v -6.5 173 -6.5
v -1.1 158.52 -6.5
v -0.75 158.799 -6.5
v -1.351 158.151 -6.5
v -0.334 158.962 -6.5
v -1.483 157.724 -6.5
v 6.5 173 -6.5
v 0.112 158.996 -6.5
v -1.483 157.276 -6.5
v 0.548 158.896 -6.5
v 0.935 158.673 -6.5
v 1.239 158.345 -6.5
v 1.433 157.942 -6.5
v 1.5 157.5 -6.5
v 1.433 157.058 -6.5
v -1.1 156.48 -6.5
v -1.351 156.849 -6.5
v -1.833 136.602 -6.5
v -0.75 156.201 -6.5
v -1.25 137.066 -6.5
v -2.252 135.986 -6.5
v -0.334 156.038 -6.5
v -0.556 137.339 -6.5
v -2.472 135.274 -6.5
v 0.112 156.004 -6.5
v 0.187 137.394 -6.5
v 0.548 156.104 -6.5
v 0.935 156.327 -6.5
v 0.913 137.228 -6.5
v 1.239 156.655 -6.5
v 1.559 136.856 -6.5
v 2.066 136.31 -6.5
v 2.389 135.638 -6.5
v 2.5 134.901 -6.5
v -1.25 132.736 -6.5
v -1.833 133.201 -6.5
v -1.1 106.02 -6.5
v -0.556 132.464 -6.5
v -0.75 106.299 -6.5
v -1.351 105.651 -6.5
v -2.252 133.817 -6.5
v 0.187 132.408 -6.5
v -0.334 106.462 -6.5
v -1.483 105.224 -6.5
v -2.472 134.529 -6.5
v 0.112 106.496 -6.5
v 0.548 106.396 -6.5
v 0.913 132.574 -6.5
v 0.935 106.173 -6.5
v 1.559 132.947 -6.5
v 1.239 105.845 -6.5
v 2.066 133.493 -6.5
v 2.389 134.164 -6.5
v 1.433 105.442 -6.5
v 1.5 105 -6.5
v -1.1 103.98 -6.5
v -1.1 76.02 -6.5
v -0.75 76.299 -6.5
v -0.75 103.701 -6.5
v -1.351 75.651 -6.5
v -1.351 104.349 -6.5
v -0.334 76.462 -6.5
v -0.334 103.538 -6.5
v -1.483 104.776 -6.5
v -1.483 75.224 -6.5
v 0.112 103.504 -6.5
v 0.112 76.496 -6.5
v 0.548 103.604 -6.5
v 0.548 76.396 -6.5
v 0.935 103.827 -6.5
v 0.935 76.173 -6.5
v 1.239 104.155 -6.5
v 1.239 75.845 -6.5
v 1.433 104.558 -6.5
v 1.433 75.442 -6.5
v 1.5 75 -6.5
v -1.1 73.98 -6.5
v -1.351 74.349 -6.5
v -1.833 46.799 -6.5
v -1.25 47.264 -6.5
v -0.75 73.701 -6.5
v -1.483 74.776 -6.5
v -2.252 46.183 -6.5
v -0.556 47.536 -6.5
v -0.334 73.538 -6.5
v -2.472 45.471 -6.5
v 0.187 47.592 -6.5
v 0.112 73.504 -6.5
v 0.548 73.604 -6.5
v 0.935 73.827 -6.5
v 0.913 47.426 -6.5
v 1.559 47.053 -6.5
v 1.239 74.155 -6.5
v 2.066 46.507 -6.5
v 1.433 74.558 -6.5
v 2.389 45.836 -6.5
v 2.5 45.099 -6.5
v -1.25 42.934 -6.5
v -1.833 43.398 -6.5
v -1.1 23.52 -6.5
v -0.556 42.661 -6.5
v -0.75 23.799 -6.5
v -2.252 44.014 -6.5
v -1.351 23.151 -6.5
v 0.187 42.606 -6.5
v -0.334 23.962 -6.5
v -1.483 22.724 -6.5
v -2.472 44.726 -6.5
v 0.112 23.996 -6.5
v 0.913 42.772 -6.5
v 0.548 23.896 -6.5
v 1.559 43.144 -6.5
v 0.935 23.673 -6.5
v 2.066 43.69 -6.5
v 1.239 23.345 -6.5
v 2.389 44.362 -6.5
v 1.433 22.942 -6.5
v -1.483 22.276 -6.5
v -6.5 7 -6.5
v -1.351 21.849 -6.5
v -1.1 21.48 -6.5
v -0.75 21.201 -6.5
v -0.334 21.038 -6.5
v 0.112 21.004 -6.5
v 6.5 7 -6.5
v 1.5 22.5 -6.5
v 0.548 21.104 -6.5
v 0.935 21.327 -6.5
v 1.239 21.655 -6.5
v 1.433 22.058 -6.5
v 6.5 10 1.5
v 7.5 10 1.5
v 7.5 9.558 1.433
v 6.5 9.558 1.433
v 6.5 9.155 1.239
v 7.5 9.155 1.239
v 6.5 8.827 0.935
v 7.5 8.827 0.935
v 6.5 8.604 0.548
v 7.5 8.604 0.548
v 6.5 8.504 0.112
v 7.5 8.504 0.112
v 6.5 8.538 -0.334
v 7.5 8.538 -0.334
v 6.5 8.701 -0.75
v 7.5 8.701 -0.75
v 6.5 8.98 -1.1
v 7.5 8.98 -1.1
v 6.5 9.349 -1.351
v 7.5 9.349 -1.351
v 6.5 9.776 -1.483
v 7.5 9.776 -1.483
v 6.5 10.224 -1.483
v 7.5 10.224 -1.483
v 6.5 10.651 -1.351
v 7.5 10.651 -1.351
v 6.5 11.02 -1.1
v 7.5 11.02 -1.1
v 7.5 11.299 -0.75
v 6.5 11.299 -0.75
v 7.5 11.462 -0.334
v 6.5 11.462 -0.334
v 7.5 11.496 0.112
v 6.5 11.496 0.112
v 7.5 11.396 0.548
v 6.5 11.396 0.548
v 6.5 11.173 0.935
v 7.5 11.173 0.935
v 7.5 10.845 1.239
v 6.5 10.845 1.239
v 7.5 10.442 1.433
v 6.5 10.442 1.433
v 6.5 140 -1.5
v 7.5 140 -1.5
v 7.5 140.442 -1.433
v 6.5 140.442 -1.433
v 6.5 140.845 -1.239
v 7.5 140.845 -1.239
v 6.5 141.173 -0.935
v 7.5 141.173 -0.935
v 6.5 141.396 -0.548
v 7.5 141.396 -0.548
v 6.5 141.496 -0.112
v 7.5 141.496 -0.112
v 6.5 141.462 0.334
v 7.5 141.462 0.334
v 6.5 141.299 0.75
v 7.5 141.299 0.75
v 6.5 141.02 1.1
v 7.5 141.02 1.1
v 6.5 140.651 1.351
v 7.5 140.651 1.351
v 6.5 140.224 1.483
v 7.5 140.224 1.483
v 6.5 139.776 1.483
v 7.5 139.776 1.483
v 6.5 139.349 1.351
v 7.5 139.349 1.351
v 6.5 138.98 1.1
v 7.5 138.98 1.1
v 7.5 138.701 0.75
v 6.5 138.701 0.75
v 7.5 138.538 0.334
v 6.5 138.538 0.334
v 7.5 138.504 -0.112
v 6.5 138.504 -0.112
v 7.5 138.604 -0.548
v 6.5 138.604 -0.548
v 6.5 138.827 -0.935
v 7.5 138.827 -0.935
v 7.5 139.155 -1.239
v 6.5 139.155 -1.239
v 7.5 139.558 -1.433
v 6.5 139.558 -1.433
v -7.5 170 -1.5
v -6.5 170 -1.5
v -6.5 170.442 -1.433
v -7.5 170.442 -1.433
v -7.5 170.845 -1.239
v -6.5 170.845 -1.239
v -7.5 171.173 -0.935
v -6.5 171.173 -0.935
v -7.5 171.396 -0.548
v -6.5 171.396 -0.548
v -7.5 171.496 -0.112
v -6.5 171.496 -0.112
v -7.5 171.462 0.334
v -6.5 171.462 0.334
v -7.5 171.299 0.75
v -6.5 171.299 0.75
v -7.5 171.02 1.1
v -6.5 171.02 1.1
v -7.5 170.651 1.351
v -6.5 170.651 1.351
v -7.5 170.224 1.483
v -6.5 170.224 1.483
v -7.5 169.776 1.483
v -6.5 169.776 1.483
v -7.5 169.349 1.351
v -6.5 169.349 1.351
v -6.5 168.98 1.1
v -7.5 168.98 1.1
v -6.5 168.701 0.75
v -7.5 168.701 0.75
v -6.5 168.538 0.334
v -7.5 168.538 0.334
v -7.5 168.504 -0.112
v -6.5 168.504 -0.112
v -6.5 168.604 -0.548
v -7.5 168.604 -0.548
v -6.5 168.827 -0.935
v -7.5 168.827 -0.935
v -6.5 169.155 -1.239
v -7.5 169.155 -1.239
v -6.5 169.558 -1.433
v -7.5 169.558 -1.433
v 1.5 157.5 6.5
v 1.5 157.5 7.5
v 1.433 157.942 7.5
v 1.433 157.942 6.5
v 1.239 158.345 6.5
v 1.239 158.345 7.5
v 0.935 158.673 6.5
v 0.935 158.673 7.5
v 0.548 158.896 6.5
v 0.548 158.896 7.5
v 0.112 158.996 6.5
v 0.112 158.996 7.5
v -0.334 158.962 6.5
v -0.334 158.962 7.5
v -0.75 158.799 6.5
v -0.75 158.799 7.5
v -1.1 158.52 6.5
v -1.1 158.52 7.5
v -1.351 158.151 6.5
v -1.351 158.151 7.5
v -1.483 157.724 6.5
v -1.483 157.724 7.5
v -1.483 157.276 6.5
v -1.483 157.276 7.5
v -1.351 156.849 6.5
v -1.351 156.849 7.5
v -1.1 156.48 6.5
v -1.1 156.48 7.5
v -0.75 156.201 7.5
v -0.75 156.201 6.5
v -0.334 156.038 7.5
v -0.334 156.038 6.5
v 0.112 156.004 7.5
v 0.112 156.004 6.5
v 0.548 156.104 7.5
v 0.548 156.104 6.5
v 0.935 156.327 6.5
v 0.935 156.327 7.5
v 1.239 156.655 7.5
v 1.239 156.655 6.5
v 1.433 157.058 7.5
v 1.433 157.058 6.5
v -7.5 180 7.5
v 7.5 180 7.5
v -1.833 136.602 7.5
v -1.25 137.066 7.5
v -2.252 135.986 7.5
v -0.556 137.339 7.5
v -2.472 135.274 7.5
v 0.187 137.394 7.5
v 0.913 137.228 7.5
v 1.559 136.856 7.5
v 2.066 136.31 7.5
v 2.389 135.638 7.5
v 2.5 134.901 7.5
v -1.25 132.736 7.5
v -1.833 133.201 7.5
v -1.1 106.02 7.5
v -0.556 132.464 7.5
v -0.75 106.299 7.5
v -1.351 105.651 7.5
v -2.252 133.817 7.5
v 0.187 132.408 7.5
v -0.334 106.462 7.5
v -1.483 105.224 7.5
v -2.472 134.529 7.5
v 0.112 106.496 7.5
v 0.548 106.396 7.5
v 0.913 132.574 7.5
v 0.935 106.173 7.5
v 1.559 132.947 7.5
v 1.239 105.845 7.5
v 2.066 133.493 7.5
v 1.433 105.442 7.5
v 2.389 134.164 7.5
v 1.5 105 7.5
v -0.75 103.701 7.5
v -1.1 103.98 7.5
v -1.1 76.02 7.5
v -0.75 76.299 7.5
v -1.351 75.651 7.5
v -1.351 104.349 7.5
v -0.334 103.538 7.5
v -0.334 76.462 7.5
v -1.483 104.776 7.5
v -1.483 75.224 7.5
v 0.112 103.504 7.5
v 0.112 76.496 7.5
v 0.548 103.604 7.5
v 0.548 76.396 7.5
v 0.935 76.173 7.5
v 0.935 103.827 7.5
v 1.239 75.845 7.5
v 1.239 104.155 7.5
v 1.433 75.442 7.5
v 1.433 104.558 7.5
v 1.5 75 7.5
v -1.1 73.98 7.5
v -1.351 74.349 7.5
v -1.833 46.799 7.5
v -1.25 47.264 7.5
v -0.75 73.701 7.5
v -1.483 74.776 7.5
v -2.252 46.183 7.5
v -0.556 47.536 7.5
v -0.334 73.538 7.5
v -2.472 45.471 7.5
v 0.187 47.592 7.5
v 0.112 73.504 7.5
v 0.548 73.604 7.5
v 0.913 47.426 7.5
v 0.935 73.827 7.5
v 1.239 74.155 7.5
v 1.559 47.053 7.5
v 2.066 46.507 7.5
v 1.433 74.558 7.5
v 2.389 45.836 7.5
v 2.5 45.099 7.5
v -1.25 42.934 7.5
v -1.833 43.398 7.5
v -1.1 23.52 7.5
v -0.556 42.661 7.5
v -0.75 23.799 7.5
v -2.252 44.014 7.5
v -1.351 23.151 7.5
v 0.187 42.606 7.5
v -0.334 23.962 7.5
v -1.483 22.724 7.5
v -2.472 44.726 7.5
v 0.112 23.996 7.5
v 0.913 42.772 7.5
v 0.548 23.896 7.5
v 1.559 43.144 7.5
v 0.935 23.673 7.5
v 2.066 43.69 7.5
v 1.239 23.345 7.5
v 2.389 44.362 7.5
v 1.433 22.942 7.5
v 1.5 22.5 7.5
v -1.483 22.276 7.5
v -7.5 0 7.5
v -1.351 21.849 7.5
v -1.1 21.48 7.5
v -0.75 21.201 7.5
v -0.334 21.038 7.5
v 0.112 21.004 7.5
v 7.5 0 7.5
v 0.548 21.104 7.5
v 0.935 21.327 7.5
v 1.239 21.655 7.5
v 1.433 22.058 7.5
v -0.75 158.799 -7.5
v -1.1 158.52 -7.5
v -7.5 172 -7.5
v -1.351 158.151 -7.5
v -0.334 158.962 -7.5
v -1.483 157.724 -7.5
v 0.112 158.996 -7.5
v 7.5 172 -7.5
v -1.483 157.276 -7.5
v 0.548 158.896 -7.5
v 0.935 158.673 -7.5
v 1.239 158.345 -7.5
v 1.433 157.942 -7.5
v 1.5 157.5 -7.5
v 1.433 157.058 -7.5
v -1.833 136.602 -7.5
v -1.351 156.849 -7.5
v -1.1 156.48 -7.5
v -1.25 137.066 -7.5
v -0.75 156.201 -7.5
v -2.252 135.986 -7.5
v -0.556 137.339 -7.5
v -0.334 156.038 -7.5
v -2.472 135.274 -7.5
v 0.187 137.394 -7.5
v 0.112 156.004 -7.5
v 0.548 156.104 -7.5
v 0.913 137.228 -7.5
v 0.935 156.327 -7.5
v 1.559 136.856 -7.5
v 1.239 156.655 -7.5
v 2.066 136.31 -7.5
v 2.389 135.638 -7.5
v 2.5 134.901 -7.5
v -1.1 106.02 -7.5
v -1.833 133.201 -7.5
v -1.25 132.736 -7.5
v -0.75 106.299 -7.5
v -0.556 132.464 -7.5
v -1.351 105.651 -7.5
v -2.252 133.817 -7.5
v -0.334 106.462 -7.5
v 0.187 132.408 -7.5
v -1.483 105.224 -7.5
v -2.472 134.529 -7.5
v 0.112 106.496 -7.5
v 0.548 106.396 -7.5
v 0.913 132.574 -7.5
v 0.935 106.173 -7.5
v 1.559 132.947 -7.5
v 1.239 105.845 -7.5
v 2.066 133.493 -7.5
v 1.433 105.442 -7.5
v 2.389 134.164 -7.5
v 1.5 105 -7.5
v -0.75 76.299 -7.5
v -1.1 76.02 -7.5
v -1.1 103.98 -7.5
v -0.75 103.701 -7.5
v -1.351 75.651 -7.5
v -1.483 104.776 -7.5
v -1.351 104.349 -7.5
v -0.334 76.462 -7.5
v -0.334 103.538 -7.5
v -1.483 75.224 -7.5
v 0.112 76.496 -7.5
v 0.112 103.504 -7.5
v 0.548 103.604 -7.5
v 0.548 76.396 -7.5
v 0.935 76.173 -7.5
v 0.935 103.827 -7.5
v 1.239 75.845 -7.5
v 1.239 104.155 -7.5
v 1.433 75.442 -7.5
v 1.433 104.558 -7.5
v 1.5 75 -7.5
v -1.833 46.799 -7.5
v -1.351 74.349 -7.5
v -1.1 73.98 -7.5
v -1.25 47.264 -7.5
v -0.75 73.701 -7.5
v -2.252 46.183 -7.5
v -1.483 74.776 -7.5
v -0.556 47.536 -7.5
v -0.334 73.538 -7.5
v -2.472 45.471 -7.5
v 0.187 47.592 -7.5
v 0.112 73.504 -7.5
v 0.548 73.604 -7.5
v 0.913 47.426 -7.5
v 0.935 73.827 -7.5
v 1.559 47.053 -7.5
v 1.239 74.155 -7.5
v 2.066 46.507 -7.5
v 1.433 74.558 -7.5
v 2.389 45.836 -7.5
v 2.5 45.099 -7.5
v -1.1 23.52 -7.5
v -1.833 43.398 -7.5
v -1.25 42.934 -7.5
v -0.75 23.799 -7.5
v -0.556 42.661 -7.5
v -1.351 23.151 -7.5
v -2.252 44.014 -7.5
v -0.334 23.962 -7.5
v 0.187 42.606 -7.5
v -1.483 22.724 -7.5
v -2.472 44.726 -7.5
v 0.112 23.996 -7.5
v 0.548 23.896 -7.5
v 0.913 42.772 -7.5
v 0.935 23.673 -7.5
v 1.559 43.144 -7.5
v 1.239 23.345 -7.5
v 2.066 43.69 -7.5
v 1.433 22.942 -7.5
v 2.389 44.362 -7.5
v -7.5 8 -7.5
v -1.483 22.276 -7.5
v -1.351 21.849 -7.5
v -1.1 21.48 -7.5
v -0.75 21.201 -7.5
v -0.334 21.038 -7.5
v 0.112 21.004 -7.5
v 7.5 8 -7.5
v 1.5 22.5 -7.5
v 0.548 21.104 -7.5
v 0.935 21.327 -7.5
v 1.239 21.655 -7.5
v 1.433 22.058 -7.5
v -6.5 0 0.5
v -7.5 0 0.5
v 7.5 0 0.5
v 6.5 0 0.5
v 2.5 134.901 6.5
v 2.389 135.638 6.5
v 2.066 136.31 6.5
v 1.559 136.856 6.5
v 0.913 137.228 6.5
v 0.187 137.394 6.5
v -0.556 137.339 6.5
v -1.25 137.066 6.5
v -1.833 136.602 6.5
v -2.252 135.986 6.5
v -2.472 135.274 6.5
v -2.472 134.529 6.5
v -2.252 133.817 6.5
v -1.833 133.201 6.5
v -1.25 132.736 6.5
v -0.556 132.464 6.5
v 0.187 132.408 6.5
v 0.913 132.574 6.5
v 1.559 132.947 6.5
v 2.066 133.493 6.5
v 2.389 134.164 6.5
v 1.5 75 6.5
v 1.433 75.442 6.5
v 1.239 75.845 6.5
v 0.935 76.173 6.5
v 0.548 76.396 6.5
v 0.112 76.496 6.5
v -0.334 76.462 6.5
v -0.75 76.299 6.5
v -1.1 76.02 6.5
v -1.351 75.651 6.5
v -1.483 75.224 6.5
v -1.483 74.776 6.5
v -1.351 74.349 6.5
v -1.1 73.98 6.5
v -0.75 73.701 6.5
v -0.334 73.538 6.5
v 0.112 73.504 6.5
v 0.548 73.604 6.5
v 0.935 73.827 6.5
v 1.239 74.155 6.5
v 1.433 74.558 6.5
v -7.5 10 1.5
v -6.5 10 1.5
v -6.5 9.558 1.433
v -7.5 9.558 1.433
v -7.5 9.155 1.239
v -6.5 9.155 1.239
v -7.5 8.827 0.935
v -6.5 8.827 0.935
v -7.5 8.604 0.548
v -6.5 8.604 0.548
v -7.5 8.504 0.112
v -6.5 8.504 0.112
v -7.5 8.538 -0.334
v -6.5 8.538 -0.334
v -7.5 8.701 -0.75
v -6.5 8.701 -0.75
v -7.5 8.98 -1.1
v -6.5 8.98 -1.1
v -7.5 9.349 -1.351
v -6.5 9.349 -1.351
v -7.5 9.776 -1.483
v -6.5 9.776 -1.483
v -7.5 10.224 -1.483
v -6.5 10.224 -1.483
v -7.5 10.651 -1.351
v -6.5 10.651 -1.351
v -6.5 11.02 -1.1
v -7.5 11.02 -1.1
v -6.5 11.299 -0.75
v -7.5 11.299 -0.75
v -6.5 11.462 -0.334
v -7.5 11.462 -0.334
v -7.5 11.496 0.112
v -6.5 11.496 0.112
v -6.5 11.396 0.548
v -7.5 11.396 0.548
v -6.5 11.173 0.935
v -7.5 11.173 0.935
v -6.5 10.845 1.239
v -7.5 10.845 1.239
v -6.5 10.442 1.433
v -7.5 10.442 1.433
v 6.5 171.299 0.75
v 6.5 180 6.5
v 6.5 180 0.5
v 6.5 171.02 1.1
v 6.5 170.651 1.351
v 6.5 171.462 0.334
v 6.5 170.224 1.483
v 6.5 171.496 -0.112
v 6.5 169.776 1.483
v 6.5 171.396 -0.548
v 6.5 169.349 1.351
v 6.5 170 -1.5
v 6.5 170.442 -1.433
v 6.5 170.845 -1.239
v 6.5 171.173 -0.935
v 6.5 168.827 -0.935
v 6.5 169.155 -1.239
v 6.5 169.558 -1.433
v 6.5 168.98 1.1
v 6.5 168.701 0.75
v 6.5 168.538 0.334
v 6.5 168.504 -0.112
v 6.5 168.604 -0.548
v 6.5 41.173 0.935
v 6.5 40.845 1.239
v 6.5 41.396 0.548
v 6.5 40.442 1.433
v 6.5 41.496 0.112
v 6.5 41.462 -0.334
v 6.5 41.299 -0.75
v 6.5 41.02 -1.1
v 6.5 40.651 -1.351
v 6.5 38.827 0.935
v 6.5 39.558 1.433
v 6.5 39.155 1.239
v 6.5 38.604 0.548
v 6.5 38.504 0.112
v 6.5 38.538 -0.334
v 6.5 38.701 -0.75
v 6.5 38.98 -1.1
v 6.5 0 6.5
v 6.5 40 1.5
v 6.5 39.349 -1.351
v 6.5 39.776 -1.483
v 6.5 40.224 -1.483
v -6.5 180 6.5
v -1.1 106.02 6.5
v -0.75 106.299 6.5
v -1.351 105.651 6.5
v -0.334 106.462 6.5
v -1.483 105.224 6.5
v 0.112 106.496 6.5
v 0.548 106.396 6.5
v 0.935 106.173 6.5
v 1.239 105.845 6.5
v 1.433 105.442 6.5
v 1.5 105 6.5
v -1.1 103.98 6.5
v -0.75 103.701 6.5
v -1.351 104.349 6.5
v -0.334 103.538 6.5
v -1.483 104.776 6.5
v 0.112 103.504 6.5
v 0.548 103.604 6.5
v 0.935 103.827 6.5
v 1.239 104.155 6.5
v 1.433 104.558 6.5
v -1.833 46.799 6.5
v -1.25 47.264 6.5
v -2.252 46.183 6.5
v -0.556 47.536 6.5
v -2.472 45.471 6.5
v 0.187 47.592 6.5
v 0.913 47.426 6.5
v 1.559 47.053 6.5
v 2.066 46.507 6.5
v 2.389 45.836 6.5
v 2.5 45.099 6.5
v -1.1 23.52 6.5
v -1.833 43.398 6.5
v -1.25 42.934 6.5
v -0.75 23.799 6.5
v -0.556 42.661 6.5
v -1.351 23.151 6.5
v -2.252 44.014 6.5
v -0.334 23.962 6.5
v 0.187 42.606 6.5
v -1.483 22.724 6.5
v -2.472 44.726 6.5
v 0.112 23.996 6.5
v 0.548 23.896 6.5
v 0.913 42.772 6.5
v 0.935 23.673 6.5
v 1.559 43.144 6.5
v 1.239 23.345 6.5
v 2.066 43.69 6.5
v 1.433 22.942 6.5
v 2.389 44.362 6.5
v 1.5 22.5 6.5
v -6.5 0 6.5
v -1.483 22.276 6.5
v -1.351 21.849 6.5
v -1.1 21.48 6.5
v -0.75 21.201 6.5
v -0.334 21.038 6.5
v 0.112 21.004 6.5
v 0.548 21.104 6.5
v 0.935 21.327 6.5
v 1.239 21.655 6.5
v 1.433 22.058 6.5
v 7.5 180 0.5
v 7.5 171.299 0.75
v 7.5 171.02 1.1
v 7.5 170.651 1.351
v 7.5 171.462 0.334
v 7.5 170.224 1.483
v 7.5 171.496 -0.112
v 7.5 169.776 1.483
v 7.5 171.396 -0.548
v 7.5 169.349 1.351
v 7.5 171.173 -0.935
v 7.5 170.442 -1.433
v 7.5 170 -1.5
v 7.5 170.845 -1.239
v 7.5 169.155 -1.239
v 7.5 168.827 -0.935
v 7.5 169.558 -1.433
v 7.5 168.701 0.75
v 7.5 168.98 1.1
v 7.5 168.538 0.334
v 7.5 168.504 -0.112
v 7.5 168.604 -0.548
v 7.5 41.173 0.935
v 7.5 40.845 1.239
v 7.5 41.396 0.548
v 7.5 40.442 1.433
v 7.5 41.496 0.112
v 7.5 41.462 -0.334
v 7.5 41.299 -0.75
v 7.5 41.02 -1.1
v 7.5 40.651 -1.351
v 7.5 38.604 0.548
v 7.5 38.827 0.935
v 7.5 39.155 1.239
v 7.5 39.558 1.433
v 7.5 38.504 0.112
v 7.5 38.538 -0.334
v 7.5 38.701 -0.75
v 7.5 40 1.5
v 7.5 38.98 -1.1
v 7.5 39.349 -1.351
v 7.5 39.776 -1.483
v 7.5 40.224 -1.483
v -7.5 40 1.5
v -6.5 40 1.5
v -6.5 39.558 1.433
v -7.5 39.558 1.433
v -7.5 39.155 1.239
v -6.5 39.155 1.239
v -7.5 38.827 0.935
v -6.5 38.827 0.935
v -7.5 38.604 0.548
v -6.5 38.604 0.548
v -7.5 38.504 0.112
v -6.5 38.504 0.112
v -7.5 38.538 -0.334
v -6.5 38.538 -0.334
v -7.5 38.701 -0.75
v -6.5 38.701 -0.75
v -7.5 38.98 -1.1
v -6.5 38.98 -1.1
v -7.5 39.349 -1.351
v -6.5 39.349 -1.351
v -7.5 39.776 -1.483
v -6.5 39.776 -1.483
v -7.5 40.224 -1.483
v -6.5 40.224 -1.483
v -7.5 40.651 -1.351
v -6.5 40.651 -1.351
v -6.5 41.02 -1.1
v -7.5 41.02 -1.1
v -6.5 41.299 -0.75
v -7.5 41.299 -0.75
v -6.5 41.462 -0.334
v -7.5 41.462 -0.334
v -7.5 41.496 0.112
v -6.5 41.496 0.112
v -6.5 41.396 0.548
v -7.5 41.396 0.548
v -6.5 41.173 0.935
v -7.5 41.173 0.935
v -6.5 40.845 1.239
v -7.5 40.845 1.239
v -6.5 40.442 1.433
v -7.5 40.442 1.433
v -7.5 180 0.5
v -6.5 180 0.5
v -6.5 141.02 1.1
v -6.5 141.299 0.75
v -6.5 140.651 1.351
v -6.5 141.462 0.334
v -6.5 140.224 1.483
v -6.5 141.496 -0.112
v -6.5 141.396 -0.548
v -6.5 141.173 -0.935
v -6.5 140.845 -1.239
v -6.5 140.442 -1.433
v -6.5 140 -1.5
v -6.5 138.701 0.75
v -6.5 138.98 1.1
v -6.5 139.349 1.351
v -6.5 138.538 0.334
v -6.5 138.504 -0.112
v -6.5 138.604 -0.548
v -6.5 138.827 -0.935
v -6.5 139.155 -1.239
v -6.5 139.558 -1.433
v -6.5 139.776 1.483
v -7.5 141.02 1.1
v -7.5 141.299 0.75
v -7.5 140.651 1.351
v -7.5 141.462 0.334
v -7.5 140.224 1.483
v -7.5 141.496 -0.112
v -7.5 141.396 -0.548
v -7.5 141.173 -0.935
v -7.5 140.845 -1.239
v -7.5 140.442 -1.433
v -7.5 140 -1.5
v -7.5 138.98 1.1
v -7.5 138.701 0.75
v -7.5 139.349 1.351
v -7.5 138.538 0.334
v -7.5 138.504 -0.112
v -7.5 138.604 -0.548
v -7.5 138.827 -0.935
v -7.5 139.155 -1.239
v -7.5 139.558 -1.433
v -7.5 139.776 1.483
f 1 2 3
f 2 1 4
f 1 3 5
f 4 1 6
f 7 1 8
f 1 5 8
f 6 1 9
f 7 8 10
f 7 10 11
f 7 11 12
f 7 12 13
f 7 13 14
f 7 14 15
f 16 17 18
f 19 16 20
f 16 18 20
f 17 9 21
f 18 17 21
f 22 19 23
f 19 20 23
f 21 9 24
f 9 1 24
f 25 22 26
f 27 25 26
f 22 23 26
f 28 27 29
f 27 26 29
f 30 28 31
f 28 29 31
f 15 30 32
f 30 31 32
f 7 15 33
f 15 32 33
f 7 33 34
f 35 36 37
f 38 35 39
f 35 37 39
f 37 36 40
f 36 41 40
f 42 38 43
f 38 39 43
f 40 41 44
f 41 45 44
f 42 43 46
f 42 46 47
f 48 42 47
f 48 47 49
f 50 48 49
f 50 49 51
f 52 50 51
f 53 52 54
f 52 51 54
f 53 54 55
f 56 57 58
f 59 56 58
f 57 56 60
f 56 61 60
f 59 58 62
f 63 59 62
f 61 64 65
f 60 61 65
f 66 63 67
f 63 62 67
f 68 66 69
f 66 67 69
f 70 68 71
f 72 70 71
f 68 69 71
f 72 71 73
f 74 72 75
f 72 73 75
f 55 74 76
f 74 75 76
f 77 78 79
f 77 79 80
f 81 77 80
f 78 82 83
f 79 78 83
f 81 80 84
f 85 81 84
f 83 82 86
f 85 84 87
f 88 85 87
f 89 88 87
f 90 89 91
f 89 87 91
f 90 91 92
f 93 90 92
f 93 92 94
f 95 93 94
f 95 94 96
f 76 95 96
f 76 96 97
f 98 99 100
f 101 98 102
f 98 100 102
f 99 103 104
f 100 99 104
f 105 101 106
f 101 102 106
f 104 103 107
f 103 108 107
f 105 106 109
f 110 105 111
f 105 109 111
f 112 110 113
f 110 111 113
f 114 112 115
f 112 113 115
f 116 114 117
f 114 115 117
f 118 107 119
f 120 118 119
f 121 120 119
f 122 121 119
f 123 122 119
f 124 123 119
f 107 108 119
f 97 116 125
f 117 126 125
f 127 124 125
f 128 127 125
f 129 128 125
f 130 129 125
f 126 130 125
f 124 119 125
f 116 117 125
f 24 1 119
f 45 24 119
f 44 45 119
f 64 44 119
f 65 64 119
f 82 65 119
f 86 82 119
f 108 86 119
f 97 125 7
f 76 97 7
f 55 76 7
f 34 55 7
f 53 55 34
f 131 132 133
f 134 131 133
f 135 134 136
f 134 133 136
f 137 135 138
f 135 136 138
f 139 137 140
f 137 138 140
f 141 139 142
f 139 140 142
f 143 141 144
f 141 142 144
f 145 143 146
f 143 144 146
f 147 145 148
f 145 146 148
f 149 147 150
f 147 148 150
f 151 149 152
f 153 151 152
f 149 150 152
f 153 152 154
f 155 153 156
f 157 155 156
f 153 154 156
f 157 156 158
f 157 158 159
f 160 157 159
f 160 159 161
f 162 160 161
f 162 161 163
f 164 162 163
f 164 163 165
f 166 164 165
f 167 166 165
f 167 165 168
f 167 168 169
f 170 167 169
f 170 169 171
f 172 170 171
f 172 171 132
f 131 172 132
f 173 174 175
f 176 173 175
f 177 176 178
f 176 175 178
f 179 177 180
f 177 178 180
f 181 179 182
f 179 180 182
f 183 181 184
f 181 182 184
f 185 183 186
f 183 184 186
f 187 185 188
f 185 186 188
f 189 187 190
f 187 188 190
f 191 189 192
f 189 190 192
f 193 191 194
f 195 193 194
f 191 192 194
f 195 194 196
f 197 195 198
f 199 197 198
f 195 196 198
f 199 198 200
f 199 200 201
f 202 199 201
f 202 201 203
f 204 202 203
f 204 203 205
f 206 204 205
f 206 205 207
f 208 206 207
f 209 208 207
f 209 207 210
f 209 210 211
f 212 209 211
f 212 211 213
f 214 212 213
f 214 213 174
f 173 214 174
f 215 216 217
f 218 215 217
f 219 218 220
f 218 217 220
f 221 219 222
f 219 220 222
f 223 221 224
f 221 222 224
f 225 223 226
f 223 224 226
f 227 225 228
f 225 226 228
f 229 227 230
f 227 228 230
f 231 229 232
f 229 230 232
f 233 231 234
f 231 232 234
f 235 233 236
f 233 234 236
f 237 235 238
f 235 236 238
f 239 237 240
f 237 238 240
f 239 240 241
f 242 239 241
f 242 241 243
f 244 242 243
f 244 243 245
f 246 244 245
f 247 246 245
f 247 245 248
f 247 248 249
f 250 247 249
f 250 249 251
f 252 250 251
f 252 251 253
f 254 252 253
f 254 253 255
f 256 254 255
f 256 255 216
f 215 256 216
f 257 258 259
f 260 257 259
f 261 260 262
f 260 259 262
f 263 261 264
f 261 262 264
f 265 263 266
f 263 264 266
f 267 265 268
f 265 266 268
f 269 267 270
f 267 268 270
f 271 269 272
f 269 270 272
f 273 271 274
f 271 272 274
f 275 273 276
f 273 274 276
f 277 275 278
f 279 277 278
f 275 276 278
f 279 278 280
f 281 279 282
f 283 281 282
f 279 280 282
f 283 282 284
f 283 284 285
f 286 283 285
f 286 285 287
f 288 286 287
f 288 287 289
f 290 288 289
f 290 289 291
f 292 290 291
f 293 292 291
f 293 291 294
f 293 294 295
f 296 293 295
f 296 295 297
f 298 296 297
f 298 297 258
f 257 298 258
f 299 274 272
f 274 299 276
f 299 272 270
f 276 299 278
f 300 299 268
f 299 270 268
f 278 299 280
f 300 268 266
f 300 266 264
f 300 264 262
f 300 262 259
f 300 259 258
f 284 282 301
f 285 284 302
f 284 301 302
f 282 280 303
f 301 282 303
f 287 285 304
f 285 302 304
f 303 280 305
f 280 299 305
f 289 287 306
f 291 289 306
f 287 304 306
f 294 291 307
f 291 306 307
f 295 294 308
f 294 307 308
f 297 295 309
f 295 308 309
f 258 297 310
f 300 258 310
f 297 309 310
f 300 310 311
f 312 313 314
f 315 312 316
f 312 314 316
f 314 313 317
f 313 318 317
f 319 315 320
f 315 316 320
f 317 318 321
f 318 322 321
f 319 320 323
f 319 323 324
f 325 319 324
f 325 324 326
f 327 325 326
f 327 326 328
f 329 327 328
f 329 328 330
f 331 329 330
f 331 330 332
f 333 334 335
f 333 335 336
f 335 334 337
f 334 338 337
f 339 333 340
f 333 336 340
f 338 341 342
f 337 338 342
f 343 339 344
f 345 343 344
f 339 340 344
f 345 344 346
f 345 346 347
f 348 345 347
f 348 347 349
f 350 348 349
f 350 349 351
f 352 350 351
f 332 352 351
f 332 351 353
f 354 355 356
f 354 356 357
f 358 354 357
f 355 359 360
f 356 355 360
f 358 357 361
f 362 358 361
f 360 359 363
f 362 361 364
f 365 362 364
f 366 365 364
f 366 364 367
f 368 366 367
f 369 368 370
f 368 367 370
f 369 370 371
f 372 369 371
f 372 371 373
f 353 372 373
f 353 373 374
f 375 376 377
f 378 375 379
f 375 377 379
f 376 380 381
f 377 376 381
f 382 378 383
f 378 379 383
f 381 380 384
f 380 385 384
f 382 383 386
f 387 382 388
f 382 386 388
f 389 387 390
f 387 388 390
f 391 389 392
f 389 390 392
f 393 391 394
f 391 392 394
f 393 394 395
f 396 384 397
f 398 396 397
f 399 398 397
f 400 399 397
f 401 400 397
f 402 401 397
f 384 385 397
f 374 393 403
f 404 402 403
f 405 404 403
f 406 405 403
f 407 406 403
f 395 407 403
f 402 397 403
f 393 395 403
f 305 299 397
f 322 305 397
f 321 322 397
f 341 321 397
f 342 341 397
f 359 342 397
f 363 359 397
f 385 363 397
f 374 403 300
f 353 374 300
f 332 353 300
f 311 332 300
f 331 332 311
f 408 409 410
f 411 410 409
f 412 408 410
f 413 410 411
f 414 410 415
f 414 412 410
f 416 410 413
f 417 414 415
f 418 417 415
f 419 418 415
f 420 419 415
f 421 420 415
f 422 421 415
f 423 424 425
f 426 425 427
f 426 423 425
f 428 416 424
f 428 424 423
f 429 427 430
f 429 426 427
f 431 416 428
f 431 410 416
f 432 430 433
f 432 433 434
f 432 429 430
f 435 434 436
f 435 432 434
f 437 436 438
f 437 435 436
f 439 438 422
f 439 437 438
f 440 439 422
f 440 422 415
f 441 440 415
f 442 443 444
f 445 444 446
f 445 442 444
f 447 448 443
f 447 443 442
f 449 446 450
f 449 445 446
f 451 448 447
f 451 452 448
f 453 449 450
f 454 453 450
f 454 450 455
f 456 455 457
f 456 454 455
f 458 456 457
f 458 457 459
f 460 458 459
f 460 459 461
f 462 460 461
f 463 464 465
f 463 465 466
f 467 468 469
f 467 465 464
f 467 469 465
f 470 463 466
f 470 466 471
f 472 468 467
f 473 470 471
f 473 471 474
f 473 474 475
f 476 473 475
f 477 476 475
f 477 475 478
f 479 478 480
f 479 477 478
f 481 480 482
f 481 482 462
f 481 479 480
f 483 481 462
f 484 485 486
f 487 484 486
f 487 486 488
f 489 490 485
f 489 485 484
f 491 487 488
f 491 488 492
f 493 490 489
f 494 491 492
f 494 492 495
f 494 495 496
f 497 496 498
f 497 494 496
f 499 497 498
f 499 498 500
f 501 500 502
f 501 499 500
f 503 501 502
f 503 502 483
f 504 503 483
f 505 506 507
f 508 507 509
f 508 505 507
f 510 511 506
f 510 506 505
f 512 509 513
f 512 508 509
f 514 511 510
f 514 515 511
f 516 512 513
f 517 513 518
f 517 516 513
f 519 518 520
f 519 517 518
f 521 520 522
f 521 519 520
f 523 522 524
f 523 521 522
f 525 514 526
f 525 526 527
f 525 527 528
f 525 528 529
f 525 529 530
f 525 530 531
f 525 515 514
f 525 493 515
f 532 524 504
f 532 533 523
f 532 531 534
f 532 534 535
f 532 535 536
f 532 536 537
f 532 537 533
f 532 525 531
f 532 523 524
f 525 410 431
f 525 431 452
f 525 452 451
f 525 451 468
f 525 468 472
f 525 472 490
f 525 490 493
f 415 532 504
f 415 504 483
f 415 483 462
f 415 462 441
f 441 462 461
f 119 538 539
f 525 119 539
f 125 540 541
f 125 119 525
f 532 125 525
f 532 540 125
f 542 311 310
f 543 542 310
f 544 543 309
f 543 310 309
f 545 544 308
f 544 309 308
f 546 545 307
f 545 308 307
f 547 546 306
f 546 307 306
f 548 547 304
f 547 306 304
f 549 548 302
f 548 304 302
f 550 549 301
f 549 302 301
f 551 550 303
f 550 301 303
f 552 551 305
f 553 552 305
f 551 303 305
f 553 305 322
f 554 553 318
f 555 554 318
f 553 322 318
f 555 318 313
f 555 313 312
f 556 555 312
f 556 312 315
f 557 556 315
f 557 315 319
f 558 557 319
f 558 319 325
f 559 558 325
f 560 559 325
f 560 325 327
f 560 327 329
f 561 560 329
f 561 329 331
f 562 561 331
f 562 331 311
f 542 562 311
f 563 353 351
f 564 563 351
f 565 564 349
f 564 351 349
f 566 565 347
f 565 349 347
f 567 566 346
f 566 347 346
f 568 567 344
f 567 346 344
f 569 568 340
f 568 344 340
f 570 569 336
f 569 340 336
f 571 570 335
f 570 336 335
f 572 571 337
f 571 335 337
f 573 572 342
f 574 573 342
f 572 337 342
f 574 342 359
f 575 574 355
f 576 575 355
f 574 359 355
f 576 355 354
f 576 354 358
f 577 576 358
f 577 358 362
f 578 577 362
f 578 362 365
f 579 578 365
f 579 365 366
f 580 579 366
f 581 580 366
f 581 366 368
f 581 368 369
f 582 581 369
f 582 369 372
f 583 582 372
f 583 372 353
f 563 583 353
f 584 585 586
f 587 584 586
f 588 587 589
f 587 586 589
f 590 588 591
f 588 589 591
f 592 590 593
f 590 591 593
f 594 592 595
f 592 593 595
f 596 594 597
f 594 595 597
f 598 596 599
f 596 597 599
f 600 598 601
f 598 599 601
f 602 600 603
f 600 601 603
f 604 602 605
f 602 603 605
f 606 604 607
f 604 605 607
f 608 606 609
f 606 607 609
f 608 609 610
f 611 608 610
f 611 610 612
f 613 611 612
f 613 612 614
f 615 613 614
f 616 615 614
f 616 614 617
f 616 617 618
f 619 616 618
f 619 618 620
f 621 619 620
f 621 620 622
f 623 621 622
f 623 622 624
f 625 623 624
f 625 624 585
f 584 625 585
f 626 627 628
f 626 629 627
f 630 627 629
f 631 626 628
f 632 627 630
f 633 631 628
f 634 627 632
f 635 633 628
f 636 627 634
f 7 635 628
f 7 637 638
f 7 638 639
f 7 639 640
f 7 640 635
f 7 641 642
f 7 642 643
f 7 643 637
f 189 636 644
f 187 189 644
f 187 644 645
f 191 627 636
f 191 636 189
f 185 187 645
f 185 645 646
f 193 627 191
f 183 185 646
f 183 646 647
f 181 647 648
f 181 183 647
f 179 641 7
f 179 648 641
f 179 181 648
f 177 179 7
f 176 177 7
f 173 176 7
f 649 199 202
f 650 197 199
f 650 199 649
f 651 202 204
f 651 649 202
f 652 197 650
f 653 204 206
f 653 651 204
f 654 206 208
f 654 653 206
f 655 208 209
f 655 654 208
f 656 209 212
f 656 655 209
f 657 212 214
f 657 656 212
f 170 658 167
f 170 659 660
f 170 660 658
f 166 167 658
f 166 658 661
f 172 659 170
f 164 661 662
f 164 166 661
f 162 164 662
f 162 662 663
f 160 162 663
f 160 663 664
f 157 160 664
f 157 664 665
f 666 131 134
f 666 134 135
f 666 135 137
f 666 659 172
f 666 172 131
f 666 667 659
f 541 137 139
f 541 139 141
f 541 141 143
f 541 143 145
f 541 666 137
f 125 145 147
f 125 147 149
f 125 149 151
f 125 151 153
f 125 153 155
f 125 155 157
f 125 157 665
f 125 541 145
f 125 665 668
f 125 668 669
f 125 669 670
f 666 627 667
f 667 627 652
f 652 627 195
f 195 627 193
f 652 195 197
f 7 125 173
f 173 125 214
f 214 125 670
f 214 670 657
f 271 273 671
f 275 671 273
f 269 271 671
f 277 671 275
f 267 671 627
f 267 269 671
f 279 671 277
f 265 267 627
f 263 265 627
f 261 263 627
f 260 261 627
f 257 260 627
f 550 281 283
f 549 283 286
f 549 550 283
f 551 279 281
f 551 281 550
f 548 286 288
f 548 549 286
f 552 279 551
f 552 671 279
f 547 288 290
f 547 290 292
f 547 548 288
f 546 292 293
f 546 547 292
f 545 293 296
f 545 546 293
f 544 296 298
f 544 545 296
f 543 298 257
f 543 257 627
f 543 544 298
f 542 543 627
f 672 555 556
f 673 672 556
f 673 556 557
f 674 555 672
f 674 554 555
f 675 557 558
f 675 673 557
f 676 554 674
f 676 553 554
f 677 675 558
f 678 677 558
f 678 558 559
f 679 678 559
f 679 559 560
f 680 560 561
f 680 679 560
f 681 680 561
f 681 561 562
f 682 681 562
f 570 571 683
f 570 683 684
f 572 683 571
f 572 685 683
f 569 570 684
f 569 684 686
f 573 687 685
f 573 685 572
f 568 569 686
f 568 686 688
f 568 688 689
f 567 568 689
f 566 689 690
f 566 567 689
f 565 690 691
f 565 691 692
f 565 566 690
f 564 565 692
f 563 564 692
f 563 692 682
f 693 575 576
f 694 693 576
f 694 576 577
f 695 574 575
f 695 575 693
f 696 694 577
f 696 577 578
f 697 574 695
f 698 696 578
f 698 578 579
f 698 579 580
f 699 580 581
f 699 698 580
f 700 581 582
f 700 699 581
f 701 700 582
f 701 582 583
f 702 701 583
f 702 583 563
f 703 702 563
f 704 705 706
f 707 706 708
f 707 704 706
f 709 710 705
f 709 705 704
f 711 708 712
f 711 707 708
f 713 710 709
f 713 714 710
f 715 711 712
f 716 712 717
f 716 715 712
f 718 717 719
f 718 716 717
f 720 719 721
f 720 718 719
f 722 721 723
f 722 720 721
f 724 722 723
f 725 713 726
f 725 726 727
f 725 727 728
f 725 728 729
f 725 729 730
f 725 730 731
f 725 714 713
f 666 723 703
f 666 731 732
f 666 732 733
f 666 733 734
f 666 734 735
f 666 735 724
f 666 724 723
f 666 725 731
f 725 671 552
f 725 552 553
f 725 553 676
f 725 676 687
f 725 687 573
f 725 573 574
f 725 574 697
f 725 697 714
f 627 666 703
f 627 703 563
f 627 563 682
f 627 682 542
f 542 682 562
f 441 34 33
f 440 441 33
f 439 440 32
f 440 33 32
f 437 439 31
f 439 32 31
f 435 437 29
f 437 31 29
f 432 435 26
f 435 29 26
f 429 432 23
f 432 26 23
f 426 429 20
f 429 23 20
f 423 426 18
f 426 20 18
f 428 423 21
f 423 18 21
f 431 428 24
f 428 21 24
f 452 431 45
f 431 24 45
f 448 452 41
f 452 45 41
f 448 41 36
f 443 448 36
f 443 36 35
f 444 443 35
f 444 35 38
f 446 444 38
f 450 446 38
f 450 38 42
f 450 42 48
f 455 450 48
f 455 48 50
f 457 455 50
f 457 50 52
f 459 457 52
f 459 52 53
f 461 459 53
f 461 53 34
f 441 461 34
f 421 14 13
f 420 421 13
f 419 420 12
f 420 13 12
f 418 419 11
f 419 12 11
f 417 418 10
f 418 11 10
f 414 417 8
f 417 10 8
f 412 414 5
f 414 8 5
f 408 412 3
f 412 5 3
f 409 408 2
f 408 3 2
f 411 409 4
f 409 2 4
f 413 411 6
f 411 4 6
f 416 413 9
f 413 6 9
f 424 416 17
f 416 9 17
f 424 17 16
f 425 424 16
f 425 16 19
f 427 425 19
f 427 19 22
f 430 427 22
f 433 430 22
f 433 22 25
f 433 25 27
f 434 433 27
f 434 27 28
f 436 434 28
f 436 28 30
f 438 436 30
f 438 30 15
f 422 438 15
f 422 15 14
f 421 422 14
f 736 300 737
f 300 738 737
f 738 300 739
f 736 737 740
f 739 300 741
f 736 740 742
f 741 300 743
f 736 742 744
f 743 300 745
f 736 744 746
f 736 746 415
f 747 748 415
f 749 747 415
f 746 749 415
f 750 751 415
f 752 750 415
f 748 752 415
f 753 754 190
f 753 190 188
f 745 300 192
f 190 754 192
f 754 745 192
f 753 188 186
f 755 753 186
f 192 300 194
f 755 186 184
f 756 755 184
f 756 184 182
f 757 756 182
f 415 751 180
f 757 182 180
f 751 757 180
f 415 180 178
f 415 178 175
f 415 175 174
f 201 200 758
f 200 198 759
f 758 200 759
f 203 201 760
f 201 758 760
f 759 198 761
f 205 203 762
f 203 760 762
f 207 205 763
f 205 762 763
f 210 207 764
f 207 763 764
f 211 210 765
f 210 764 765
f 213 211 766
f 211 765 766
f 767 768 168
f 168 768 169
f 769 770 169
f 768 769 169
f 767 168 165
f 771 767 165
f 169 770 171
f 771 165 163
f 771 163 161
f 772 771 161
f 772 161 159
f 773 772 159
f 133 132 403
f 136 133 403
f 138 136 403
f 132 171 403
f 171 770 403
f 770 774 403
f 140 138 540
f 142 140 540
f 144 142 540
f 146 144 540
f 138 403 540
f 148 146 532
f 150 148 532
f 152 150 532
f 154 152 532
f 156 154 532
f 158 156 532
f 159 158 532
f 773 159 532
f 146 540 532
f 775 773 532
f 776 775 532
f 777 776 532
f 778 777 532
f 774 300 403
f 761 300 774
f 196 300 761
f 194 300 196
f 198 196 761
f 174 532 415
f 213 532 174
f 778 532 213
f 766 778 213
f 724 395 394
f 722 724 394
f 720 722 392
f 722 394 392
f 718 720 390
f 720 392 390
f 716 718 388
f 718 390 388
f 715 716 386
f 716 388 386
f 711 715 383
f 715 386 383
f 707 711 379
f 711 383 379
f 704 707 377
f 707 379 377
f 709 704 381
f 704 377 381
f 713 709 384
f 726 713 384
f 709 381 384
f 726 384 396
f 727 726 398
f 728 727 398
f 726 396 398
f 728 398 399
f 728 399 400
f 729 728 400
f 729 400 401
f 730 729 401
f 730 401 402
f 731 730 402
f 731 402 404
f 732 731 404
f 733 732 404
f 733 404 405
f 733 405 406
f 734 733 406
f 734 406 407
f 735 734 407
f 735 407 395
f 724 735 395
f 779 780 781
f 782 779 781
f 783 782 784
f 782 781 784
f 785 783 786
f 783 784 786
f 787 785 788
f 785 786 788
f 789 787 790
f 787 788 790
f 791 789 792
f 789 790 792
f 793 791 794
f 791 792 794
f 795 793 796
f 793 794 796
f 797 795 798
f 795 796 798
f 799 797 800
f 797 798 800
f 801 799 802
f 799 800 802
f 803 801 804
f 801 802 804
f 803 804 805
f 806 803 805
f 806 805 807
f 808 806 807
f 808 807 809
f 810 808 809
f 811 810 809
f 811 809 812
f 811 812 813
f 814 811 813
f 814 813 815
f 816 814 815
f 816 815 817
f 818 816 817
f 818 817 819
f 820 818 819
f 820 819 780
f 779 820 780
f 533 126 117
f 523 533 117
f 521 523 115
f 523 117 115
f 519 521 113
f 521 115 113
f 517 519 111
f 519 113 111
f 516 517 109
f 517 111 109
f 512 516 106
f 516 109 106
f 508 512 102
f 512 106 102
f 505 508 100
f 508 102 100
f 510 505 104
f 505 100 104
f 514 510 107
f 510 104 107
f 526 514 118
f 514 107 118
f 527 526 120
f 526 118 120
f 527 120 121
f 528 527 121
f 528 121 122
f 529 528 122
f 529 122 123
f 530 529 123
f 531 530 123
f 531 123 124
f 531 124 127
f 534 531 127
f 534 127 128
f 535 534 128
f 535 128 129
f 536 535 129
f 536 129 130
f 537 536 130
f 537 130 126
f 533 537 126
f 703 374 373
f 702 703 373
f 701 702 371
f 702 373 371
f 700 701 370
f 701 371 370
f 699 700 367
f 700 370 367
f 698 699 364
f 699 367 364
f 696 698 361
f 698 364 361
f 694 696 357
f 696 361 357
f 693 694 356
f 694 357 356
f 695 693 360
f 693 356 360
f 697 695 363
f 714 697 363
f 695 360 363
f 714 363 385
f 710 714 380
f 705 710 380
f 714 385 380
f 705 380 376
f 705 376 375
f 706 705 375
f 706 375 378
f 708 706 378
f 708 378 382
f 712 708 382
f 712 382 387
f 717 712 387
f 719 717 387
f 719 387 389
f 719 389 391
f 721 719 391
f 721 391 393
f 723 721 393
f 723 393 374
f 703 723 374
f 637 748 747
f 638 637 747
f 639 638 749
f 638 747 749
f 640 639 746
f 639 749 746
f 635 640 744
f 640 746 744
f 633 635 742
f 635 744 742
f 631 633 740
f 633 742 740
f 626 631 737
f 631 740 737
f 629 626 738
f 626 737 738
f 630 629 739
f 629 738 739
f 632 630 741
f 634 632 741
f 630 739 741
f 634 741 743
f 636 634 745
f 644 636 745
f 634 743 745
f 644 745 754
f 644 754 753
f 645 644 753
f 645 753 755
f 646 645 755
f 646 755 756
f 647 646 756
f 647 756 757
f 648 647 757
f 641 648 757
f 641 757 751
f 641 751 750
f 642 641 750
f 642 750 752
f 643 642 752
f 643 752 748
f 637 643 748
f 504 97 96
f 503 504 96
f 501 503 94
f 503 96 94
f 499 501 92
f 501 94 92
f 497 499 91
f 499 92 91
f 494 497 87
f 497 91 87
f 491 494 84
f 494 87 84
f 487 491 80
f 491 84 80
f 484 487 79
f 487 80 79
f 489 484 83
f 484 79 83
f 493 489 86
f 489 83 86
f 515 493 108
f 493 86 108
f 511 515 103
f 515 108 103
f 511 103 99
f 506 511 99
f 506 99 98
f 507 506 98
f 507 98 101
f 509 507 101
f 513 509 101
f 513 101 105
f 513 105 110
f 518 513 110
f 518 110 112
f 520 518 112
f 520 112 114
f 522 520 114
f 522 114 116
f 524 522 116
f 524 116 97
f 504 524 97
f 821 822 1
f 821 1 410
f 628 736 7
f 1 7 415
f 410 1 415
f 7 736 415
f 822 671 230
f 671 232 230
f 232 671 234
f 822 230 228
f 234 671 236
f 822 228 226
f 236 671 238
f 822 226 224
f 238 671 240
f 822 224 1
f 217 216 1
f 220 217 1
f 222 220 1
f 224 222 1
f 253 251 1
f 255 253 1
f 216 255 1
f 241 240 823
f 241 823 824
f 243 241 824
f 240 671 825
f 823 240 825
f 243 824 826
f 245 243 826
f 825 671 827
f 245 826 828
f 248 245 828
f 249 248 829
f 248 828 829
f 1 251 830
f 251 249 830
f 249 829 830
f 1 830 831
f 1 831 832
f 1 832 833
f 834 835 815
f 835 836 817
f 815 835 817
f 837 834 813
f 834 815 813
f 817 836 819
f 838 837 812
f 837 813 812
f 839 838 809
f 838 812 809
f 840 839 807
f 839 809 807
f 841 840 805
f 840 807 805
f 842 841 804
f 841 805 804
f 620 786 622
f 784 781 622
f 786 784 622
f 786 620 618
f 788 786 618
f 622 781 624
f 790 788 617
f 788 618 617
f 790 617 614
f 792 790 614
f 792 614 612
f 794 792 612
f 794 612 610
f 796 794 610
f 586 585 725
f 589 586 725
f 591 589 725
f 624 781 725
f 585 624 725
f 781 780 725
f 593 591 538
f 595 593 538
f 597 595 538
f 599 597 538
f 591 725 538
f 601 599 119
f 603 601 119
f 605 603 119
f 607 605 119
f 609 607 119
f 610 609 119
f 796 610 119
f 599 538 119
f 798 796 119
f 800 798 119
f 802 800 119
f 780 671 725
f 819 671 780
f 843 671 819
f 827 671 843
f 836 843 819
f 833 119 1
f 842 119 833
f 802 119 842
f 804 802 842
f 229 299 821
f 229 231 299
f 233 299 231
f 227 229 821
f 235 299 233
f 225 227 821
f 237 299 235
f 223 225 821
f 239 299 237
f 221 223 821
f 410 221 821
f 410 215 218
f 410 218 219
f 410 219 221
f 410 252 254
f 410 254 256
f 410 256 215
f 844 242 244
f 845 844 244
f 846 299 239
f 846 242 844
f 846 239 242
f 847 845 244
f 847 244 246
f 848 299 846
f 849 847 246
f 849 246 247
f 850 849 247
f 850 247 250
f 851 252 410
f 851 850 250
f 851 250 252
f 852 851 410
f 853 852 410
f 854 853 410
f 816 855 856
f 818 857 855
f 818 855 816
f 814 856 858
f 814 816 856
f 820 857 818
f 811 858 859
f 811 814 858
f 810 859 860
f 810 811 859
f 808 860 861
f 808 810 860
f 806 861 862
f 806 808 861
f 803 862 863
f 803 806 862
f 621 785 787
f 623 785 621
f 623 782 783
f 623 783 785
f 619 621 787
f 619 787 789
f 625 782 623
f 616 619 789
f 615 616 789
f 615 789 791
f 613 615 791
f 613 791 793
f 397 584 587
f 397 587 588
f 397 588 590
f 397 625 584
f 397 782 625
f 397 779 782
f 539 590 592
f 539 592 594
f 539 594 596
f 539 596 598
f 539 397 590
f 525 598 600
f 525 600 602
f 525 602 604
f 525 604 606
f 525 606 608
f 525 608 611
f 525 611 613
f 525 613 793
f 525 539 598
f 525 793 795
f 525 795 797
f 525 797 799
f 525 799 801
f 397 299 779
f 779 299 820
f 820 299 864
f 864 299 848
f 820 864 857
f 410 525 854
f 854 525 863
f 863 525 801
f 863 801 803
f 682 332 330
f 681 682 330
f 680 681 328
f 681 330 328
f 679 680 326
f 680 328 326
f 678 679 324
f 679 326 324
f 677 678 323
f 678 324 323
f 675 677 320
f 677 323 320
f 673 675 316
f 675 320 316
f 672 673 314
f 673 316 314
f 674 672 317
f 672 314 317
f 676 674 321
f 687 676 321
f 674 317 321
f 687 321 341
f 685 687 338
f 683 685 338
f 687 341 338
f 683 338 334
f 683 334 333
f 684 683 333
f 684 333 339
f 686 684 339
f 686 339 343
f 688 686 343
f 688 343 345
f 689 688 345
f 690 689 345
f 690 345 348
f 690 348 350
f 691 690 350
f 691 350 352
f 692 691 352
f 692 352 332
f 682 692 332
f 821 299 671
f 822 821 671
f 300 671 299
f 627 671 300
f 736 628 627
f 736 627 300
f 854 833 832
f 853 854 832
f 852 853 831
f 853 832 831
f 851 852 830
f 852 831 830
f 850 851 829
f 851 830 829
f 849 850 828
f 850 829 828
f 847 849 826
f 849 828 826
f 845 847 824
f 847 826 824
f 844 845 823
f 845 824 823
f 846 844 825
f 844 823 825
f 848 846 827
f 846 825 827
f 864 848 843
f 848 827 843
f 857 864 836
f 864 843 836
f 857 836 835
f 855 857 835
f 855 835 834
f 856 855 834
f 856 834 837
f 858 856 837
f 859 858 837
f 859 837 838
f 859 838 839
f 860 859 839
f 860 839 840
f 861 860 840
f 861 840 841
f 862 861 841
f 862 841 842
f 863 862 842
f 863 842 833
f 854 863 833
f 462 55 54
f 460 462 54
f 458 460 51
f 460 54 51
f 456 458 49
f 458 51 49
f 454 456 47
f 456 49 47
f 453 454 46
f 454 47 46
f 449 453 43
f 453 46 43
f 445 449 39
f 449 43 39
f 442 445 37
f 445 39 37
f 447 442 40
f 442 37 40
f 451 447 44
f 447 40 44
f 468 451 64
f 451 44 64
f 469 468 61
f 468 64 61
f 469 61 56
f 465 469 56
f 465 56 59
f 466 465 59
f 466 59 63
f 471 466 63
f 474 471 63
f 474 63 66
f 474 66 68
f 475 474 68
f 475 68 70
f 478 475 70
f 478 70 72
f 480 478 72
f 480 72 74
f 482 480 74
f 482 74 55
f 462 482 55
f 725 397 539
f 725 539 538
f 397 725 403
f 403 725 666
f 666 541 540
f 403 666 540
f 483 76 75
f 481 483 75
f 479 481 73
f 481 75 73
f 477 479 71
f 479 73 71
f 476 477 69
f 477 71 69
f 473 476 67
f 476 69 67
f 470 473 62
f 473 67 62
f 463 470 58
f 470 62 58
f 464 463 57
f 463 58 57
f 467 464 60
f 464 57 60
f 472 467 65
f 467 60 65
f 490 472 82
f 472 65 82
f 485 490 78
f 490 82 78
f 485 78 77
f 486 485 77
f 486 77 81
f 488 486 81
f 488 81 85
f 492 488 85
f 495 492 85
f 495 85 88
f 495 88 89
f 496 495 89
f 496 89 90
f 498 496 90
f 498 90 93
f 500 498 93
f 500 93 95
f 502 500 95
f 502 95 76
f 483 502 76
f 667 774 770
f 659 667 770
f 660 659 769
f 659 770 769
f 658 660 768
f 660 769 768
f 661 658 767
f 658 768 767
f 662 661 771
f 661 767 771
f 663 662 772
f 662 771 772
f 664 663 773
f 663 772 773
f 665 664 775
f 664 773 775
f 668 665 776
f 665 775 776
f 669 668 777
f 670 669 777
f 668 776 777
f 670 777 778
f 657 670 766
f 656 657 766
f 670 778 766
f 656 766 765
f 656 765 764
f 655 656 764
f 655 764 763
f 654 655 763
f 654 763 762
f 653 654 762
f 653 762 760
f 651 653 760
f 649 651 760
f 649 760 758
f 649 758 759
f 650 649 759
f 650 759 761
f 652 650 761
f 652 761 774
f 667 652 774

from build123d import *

# Parameters (mm, degrees)
SKETCH_1_W          = 15
SKETCH_1_H          = 15
SKETCH_1_W_2        = 13
SKETCH_1_H_2        = 13
EXTRUDE_1_DEPTH     = 180
SKETCH_2_R          = 2.5
SKETCH_2_R_2        = 1.5
CUT_EXTRUDE_1_DEPTH = 181.779561898
SKETCH_3_R          = 1.5
CUT_EXTRUDE_2_DEPTH = 181.779561898


with BuildPart() as part:
    # 草图1 → 凸台-拉伸1 (new body)
    with BuildSketch(Plane(origin=(0, 0, 0), x_dir=(1, 0, 0), z_dir=(0, 1, 0))):
        Rectangle(SKETCH_1_W, SKETCH_1_H)
        Rectangle(SKETCH_1_W_2, SKETCH_1_H_2, mode=Mode.SUBTRACT)
    extrude(amount=EXTRUDE_1_DEPTH)

    # 草图2 → 切除-拉伸1 (cut, through all)
    with BuildSketch(Plane.XY.offset(7.5)):
        with Locations((0, 134.901280605)):
            Circle(SKETCH_2_R)
        with Locations((0, 45.098719395)):
            Circle(SKETCH_2_R)
        with Locations((0, 187.5)):
            Circle(SKETCH_2_R_2)
        with Locations((0, 157.5)):
            Circle(SKETCH_2_R_2)
        with Locations((0, -7.5)):
            Circle(SKETCH_2_R_2)
        with Locations((0, 22.5)):
            Circle(SKETCH_2_R_2)
        with Locations((0, 105)):
            Circle(SKETCH_2_R_2)
        with Locations((0, 75)):
            Circle(SKETCH_2_R_2)
    extrude(amount=-CUT_EXTRUDE_1_DEPTH, mode=Mode.SUBTRACT)

    # 草图3 → 切除-拉伸2 (cut, through all)
    with BuildSketch(Plane(origin=(7.5, 0, 0), x_dir=(0, 0, -1), z_dir=(1, 0, 0))):
        with Locations((0, 170)):
            Circle(SKETCH_3_R)
        with Locations((0, 140)):
            Circle(SKETCH_3_R)
        with Locations(Location((0, 10, 0), (0, 0, 180))):
            Circle(SKETCH_3_R)
        with Locations(Location((0, 40, 0), (0, 0, 180))):
            Circle(SKETCH_3_R)
        Polygon((7.5, 172), (7.5, 180), (-0.5, 180), align=None)
        Polygon((-0.5, 0), (7.5, 8), (7.5, 0), align=None)
    extrude(amount=-CUT_EXTRUDE_2_DEPTH, mode=Mode.SUBTRACT)


solid = part.part
